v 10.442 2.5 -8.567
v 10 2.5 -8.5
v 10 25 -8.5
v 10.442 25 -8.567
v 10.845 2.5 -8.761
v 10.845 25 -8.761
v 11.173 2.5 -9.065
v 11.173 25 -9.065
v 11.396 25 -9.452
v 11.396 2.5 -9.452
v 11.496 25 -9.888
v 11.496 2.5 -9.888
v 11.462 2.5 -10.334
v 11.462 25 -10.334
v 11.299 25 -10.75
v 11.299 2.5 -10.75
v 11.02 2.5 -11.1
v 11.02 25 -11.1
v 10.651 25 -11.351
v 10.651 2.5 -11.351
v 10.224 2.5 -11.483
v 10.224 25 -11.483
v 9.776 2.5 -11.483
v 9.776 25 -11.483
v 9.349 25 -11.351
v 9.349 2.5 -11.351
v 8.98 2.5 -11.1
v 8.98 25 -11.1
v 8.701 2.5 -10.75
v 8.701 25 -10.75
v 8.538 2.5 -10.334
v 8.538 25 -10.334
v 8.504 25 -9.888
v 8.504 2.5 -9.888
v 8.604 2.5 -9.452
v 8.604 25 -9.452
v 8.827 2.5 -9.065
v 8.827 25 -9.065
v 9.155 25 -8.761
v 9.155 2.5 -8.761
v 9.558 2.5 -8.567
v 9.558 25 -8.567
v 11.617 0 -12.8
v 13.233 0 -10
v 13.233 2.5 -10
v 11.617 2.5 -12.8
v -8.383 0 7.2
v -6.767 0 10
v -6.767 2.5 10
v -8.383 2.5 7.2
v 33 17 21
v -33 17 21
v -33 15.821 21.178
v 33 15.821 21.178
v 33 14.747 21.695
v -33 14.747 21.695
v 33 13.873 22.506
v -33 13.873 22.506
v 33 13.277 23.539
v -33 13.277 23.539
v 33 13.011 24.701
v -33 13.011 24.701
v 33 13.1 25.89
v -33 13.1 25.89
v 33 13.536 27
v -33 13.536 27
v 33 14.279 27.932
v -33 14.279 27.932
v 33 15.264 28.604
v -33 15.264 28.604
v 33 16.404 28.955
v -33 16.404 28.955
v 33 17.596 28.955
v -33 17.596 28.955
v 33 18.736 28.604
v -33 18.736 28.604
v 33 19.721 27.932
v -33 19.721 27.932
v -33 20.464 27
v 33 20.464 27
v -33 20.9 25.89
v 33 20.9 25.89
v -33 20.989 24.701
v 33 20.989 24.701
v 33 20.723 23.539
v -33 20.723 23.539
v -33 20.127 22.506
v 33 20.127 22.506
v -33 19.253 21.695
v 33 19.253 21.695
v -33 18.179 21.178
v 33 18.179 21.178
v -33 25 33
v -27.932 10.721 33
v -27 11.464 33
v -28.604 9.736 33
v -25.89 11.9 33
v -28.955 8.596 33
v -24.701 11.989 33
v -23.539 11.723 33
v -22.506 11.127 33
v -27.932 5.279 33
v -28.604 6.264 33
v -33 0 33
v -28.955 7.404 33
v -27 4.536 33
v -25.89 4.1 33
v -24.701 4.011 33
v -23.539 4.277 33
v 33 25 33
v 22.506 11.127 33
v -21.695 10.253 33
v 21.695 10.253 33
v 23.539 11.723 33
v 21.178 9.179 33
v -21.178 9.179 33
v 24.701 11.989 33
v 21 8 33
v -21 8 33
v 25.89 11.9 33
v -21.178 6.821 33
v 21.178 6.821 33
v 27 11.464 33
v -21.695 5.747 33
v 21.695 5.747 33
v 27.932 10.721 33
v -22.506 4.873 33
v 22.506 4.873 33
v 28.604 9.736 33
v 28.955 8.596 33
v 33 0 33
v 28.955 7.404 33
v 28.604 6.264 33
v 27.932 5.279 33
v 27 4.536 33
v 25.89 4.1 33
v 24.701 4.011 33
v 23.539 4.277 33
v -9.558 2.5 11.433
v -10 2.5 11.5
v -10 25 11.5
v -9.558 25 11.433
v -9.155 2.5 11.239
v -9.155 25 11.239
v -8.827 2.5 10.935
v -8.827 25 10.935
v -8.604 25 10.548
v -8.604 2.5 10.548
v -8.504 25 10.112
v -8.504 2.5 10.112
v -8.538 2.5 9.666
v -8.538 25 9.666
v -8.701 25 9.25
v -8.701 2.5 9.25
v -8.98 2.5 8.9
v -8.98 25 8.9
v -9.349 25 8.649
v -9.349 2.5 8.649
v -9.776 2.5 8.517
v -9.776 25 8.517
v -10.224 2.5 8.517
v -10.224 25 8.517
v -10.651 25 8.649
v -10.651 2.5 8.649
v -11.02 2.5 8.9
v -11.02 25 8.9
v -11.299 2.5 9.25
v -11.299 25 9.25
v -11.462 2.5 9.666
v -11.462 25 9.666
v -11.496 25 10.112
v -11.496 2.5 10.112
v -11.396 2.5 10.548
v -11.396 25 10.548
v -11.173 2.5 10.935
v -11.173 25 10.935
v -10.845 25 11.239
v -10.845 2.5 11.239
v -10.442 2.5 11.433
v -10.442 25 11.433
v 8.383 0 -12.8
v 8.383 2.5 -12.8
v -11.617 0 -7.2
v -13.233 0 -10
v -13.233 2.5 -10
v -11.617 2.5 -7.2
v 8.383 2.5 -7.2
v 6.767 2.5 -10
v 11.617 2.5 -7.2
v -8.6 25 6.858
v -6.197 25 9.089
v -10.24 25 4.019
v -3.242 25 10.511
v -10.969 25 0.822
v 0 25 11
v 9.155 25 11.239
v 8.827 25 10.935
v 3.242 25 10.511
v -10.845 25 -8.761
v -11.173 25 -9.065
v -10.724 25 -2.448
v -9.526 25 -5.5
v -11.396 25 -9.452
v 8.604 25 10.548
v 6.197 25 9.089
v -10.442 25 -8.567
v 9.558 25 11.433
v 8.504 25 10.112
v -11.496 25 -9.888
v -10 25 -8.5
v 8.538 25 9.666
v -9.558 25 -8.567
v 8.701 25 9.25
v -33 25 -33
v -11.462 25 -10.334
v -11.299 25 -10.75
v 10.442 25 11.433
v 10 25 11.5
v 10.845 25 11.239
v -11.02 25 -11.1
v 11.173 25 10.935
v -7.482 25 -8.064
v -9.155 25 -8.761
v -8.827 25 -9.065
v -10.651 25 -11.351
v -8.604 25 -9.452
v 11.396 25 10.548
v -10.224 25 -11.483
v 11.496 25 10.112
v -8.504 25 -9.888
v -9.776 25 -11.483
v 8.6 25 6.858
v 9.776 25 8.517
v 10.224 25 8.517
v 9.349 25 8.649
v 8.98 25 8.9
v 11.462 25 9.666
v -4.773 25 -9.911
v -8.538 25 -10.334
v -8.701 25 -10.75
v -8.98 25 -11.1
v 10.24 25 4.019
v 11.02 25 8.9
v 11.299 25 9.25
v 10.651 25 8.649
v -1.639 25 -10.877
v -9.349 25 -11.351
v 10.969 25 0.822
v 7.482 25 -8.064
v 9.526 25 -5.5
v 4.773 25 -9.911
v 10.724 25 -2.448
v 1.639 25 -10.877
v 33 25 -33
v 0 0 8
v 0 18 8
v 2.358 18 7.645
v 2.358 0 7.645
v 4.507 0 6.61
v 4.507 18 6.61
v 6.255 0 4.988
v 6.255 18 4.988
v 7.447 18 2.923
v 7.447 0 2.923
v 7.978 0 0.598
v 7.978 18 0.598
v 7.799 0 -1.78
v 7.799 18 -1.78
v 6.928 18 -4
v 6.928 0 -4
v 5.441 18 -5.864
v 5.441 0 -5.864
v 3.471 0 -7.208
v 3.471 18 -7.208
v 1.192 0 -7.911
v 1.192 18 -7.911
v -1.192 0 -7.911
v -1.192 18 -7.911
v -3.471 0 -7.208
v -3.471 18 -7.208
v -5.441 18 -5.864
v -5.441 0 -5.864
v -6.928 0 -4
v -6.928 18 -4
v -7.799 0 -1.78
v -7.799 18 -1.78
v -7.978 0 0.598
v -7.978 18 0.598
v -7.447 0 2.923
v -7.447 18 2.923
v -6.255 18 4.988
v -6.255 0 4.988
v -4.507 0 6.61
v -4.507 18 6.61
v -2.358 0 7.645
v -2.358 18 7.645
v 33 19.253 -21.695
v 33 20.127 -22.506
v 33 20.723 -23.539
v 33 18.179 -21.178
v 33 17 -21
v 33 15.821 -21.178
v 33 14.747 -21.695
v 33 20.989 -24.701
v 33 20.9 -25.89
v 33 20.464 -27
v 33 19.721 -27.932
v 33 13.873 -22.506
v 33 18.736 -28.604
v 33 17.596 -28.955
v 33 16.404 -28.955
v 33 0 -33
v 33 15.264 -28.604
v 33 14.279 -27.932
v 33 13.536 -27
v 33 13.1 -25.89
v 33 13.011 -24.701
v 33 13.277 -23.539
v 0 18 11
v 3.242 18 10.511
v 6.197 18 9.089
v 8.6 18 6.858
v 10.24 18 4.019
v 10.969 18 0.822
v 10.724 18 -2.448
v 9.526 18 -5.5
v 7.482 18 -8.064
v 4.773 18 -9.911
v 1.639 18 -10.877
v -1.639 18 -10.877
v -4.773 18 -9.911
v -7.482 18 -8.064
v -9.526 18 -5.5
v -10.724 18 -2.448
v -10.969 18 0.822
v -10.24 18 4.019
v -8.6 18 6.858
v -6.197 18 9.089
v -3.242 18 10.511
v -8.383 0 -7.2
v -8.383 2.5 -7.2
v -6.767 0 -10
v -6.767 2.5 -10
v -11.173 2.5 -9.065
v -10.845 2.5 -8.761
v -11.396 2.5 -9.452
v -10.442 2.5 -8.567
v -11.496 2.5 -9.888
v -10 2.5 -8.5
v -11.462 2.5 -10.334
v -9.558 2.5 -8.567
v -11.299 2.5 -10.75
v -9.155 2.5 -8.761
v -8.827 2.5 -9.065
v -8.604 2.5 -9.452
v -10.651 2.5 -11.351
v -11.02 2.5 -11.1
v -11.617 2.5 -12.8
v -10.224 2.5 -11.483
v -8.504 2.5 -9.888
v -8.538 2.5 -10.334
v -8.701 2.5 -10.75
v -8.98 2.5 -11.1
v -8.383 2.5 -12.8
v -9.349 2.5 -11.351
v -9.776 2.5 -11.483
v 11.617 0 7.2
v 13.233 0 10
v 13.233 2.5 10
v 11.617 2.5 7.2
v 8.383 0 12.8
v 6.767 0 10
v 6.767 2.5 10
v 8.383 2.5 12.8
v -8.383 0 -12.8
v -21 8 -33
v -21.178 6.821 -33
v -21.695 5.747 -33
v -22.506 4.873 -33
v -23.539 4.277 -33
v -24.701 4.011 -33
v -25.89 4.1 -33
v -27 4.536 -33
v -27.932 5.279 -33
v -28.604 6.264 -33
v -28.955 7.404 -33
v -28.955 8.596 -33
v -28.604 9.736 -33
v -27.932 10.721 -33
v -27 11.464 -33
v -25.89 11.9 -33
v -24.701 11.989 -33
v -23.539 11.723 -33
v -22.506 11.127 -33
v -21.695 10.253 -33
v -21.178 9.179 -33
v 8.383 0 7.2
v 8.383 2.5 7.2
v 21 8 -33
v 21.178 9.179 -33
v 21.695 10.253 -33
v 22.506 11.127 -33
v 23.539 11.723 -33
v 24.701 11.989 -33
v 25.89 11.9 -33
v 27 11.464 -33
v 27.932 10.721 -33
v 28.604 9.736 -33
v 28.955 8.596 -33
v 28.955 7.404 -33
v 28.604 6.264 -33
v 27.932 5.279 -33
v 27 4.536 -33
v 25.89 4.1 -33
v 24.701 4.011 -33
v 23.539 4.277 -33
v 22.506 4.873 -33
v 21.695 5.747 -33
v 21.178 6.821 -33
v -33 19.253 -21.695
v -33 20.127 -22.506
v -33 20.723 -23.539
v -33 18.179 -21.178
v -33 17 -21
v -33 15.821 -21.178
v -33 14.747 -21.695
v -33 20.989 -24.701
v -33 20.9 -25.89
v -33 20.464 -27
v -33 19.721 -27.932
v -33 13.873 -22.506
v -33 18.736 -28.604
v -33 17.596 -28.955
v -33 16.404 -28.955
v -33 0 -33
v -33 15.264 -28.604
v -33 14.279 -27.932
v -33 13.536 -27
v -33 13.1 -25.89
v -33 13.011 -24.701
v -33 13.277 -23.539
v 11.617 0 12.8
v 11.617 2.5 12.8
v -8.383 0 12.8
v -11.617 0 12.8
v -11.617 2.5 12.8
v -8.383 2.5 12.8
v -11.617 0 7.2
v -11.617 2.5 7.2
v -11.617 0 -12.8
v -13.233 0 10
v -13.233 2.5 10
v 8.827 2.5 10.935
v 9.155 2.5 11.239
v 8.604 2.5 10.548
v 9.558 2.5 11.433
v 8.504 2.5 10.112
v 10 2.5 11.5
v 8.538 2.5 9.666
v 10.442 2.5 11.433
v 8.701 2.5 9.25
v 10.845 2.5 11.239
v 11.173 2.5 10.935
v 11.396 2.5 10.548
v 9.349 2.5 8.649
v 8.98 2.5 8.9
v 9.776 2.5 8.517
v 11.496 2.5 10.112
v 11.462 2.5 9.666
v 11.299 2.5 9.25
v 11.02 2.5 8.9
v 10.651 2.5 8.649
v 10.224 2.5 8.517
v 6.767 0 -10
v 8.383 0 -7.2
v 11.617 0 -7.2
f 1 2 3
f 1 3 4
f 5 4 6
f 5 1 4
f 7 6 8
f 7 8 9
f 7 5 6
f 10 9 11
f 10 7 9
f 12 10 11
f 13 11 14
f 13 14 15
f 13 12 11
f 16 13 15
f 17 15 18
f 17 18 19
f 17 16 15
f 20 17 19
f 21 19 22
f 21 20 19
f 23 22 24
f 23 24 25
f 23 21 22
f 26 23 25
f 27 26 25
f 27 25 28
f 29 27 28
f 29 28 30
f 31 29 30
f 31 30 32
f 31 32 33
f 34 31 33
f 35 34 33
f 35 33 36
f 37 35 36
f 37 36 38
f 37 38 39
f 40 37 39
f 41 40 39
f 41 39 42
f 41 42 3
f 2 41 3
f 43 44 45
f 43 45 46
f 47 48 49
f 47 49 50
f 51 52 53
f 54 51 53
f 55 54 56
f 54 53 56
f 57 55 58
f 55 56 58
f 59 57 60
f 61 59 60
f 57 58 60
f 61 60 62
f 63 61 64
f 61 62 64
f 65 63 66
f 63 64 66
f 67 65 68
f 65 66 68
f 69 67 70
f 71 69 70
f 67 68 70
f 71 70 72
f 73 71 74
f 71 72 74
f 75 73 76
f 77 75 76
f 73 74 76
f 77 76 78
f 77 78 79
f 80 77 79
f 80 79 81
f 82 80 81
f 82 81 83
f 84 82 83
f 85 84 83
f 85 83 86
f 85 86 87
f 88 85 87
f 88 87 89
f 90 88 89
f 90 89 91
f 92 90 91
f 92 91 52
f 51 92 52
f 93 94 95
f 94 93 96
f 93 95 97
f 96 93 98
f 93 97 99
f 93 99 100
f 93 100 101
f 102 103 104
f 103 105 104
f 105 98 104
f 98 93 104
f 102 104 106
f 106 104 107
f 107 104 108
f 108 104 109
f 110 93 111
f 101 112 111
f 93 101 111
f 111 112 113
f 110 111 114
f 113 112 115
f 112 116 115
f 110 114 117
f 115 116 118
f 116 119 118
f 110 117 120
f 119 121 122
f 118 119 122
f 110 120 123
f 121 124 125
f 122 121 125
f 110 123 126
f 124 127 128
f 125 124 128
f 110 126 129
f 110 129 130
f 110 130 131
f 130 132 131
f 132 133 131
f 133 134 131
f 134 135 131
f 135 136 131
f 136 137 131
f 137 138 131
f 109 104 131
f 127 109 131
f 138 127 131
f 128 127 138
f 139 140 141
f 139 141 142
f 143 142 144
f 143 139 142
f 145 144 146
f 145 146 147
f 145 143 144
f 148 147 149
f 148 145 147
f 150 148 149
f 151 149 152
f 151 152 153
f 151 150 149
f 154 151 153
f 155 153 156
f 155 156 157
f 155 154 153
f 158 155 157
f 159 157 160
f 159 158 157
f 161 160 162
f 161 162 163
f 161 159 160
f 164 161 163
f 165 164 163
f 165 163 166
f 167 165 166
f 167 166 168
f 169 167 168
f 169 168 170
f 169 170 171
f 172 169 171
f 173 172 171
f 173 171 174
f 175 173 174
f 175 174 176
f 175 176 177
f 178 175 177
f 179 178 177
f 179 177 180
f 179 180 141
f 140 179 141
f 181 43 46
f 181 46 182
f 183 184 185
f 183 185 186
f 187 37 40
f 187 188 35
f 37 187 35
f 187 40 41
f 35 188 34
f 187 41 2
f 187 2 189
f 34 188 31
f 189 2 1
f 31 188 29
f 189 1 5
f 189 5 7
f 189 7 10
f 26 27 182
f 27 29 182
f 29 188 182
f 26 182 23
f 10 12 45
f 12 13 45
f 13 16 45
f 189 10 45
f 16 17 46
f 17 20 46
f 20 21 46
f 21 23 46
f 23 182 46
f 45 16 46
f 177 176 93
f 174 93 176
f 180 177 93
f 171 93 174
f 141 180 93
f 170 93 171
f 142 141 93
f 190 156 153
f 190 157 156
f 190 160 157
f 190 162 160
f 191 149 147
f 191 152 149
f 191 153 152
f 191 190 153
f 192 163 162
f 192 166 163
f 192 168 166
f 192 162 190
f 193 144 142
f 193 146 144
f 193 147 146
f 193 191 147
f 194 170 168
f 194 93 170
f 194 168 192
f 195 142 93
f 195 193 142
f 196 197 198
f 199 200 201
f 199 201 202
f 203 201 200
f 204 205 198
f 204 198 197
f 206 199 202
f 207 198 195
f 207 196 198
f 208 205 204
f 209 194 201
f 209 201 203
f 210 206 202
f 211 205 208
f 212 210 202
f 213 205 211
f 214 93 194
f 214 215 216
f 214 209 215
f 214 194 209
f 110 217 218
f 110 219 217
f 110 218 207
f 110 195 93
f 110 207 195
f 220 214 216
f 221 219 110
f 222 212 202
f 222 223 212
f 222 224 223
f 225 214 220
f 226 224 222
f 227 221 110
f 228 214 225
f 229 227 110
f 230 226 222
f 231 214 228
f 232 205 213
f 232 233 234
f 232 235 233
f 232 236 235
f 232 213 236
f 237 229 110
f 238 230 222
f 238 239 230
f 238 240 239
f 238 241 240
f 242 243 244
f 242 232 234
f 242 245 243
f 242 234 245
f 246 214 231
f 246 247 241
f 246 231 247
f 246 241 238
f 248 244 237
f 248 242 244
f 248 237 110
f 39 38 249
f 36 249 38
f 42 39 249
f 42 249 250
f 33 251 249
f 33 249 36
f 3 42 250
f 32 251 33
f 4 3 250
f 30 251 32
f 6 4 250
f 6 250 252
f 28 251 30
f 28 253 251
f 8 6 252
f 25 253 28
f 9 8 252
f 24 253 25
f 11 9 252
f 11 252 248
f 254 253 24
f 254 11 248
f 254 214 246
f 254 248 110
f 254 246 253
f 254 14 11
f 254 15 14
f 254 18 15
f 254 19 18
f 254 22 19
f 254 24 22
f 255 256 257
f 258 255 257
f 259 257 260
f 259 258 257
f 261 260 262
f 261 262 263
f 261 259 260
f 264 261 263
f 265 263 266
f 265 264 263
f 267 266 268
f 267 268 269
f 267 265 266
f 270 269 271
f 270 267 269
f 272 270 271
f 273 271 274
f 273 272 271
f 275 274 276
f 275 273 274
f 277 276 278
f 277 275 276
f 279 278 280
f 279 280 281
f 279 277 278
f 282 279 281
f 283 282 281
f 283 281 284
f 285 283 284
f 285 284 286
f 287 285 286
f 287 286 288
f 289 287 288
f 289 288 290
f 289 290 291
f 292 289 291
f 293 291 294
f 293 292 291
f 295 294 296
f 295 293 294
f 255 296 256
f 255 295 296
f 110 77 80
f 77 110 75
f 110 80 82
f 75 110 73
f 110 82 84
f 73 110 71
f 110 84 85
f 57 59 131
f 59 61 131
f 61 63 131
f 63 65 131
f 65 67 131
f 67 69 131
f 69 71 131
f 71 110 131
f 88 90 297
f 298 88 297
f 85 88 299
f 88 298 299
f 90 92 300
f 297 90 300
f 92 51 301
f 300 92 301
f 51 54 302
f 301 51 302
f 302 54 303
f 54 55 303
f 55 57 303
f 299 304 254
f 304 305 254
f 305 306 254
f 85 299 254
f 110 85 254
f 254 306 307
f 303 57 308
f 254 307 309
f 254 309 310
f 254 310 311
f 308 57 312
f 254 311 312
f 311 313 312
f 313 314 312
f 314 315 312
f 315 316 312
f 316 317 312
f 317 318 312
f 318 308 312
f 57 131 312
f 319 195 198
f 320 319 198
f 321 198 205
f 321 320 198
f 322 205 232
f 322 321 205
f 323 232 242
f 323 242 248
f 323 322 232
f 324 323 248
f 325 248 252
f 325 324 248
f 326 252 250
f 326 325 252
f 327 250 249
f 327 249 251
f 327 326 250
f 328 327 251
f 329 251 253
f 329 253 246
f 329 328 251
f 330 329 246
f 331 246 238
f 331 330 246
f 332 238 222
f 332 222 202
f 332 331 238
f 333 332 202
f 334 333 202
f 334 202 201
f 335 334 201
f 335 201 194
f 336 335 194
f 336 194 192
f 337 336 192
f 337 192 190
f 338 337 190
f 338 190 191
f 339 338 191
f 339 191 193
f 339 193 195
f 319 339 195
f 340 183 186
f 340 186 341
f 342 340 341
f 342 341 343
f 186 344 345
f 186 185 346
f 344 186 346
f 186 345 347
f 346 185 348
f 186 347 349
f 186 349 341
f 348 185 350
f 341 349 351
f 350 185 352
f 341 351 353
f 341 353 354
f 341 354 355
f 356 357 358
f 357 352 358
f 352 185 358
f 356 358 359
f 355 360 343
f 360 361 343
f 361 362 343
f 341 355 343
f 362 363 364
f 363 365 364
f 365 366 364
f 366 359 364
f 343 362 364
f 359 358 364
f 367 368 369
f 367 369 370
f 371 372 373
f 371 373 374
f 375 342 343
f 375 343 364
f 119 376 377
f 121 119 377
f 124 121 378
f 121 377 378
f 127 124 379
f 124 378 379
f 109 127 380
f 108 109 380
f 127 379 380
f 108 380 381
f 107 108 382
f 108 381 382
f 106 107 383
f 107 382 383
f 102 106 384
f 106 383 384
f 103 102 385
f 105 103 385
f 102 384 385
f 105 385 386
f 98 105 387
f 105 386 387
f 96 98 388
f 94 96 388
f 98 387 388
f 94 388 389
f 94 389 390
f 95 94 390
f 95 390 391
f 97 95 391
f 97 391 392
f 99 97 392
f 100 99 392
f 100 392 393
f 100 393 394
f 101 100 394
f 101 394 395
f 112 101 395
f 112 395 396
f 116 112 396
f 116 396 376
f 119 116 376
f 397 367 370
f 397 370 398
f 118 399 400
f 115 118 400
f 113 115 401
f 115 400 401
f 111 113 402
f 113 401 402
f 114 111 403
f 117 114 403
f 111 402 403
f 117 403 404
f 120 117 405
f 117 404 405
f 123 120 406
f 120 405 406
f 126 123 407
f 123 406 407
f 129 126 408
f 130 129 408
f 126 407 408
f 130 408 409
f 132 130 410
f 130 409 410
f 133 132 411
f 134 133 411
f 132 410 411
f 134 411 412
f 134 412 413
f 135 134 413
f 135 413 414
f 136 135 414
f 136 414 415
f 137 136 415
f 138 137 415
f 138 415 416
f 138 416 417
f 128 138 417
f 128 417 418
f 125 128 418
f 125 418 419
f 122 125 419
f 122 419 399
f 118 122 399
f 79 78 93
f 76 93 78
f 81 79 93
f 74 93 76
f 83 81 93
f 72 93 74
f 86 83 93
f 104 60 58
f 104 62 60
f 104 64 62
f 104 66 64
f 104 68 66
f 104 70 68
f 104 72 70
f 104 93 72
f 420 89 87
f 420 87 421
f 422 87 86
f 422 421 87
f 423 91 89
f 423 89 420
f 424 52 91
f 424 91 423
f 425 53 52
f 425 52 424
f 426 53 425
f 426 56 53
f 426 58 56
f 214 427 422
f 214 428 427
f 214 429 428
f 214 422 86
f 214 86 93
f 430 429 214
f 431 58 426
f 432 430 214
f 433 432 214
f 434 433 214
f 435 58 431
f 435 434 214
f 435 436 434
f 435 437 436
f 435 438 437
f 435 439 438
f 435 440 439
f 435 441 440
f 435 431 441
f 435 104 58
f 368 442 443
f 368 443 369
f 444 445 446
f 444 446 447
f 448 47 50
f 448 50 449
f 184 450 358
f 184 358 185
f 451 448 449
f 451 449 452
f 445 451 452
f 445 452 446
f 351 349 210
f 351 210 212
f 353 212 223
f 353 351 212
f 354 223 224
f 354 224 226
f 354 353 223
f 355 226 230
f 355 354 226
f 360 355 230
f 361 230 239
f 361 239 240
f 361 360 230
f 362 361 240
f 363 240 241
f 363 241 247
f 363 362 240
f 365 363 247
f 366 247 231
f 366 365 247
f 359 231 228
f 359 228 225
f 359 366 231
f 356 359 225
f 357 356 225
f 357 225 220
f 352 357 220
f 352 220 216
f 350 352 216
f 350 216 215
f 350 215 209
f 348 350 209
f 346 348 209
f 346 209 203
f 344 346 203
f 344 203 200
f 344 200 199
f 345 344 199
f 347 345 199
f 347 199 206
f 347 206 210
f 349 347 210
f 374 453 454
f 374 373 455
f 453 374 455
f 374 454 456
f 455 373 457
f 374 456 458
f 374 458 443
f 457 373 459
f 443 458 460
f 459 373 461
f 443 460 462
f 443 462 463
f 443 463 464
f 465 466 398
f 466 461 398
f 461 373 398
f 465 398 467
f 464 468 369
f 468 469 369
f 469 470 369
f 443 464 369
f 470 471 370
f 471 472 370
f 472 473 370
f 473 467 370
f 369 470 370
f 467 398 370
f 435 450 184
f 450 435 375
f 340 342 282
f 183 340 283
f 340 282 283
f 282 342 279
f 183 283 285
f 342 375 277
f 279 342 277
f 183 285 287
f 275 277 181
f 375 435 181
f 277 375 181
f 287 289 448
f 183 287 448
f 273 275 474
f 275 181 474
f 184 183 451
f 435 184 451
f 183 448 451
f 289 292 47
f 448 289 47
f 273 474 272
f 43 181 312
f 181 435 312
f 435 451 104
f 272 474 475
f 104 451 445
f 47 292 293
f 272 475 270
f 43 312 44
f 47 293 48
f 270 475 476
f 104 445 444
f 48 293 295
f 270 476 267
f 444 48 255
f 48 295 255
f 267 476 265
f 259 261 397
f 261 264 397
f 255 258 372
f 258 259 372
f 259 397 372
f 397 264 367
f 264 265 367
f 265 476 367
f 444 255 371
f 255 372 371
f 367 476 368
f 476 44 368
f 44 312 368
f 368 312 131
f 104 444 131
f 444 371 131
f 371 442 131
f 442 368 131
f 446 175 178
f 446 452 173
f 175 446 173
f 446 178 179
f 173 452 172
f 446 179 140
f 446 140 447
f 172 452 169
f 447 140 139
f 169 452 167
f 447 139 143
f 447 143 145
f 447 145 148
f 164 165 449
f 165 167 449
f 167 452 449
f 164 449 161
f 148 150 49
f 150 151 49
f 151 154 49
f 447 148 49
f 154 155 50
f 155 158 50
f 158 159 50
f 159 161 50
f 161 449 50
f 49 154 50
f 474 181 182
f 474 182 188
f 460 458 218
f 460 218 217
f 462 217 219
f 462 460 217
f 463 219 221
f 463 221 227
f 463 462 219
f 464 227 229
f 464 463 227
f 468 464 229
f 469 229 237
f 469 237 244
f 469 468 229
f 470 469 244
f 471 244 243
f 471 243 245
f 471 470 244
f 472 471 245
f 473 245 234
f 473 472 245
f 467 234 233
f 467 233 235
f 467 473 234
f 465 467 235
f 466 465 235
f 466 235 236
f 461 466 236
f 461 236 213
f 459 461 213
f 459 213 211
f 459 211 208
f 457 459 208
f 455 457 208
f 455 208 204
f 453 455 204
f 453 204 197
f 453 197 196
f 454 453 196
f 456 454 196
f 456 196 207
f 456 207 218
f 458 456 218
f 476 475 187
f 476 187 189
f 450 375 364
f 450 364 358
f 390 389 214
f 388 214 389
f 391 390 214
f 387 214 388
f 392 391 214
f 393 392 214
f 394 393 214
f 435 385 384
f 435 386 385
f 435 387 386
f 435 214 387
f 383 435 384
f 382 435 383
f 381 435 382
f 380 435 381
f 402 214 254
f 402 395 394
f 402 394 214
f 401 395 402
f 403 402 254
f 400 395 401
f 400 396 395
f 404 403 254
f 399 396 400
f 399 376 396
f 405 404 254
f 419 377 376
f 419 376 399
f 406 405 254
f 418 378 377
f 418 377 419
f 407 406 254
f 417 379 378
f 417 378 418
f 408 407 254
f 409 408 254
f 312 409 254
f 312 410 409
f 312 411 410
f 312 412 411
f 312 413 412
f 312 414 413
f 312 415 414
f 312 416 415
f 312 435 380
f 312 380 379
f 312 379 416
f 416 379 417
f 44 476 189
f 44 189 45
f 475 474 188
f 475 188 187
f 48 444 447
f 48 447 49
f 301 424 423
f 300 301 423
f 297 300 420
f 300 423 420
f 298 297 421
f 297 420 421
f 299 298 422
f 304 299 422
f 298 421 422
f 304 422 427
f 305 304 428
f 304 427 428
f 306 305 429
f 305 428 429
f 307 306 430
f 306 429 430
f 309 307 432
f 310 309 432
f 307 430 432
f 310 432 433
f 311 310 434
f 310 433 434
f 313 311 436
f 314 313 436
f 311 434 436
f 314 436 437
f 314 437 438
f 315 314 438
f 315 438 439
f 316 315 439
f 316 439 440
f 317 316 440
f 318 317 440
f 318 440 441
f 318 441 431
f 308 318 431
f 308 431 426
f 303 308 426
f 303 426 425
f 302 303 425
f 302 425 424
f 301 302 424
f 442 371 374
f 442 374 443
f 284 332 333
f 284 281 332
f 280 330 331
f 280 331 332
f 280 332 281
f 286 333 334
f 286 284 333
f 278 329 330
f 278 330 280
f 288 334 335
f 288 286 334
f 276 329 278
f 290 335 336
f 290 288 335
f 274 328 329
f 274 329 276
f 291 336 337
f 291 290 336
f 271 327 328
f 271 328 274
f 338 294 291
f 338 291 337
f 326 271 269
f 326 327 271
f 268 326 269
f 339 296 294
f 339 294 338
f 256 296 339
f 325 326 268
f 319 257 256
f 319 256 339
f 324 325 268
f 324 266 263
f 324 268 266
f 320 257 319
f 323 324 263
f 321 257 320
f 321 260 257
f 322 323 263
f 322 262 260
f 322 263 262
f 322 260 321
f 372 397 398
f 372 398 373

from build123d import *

# Parameters (mm, degrees)
SKETCH1_W           = 66
SKETCH1_H           = 66
SKETCH1_R           = 11
SKETCH1_R_2         = 1.5
BOSS_EXTRUDE1_DEPTH = 25
SKETCH1_4_R         = 11
SKETCH1_4_R_2       = 8
BOSS_EXTRUDE2_DEPTH = 18
SKETCH2_R           = 4
CUT_EXTRUDE1_DEPTH  = 78.910204723
SKETCH3_R           = 4
CUT_EXTRUDE2_DEPTH  = 78.910204723
SKETCH1_5_R         = 1.5
CUT_EXTRUDE3_DEPTH  = 2.5


with BuildPart() as part:
    # Sketch1 → Boss-Extrude1 (new body)
    with BuildSketch(Plane(origin=(0, 0, 0), x_dir=(1, 0, 0), z_dir=(0, 1, 0))):
        Rectangle(SKETCH1_W, SKETCH1_H)
        Circle(SKETCH1_R, mode=Mode.SUBTRACT)
        with Locations((10, 10)):
            Circle(SKETCH1_R_2, mode=Mode.SUBTRACT)
        with Locations((-10, -10)):
            Circle(SKETCH1_R_2, mode=Mode.SUBTRACT)
        with Locations((10, -10)):
            Circle(SKETCH1_R_2, mode=Mode.SUBTRACT)
        with Locations((-10, 10)):
            Circle(SKETCH1_R_2, mode=Mode.SUBTRACT)
    extrude(amount=BOSS_EXTRUDE1_DEPTH)

    # Sketch1<4> → Boss-Extrude2 (add)
    with BuildSketch(Plane(origin=(0, 0, 0), x_dir=(1, 0, 0), z_dir=(0, 1, 0))):
        Circle(SKETCH1_4_R)
        Circle(SKETCH1_4_R_2, mode=Mode.SUBTRACT)
    extrude(amount=BOSS_EXTRUDE2_DEPTH)

    # Sketch2 → Cut-Extrude1 (cut, through all)
    with BuildSketch(Plane.ZY.offset(33)):
        with Locations((-25, 17)):
            Circle(SKETCH2_R)
        with Locations((25, 17)):
            Circle(SKETCH2_R)
    extrude(amount=-CUT_EXTRUDE1_DEPTH, mode=Mode.SUBTRACT)

    # Sketch3 → Cut-Extrude2 (cut, through all)
    with BuildSketch(Plane(origin=(0, 0, -33), x_dir=(-1, 0, 0), z_dir=(0, 0, -1))):
        with Locations((-25, 8)):
            Circle(SKETCH3_R)
        with Locations((25, 8)):
            Circle(SKETCH3_R)
    extrude(amount=-CUT_EXTRUDE2_DEPTH, mode=Mode.SUBTRACT)

    # Sketch1<5> → Cut-Extrude3 (cut)
    # profile 1 of 4: a face of its own
    with BuildSketch(Plane(origin=(0, 0, 0), x_dir=(1, 0, 0), z_dir=(0, 1, 0))):
        Polygon((11.616580754, 7.2), (13.233161507, 10), (11.616580754, 12.8), (8.383419246, 12.8), (6.766838493, 10), (8.383419246, 7.2), align=None)
        with Locations((10, 10)):
            Circle(SKETCH1_5_R, mode=Mode.SUBTRACT)
    # profile 2 of 4: a face of its own
    with BuildSketch(Plane(origin=(0, 0, 0), x_dir=(1, 0, 0), z_dir=(0, 1, 0))):
        Polygon((-8.383419246, 7.2), (-6.766838493, 10), (-8.383419246, 12.8), (-11.616580754, 12.8), (-13.233161507, 10), (-11.616580754, 7.2), align=None)
        with Locations((-10, 10)):
            Circle(SKETCH1_5_R, mode=Mode.SUBTRACT)
    # profile 3 of 4: a face of its own
    with BuildSketch(Plane(origin=(0, 0, 0), x_dir=(1, 0, 0), z_dir=(0, 1, 0))):
        Polygon((11.616580754, -12.8), (13.233161507, -10), (11.616580754, -7.2), (8.383419246, -7.2), (6.766838493, -10), (8.383419246, -12.8), align=None)
        with Locations((10, -10)):
            Circle(SKETCH1_5_R, mode=Mode.SUBTRACT)
    # profile 4 of 4: a face of its own
    with BuildSketch(Plane(origin=(0, 0, 0), x_dir=(1, 0, 0), z_dir=(0, 1, 0))):
        Polygon((-8.383419246, -12.8), (-6.766838493, -10), (-8.383419246, -7.2), (-11.616580754, -7.2), (-13.233161507, -10), (-11.616580754, -12.8), align=None)
        with Locations((-10, -10)):
            Circle(SKETCH1_5_R, mode=Mode.SUBTRACT)
    extrude(amount=CUT_EXTRUDE3_DEPTH, mode=Mode.SUBTRACT)


solid = part.part
